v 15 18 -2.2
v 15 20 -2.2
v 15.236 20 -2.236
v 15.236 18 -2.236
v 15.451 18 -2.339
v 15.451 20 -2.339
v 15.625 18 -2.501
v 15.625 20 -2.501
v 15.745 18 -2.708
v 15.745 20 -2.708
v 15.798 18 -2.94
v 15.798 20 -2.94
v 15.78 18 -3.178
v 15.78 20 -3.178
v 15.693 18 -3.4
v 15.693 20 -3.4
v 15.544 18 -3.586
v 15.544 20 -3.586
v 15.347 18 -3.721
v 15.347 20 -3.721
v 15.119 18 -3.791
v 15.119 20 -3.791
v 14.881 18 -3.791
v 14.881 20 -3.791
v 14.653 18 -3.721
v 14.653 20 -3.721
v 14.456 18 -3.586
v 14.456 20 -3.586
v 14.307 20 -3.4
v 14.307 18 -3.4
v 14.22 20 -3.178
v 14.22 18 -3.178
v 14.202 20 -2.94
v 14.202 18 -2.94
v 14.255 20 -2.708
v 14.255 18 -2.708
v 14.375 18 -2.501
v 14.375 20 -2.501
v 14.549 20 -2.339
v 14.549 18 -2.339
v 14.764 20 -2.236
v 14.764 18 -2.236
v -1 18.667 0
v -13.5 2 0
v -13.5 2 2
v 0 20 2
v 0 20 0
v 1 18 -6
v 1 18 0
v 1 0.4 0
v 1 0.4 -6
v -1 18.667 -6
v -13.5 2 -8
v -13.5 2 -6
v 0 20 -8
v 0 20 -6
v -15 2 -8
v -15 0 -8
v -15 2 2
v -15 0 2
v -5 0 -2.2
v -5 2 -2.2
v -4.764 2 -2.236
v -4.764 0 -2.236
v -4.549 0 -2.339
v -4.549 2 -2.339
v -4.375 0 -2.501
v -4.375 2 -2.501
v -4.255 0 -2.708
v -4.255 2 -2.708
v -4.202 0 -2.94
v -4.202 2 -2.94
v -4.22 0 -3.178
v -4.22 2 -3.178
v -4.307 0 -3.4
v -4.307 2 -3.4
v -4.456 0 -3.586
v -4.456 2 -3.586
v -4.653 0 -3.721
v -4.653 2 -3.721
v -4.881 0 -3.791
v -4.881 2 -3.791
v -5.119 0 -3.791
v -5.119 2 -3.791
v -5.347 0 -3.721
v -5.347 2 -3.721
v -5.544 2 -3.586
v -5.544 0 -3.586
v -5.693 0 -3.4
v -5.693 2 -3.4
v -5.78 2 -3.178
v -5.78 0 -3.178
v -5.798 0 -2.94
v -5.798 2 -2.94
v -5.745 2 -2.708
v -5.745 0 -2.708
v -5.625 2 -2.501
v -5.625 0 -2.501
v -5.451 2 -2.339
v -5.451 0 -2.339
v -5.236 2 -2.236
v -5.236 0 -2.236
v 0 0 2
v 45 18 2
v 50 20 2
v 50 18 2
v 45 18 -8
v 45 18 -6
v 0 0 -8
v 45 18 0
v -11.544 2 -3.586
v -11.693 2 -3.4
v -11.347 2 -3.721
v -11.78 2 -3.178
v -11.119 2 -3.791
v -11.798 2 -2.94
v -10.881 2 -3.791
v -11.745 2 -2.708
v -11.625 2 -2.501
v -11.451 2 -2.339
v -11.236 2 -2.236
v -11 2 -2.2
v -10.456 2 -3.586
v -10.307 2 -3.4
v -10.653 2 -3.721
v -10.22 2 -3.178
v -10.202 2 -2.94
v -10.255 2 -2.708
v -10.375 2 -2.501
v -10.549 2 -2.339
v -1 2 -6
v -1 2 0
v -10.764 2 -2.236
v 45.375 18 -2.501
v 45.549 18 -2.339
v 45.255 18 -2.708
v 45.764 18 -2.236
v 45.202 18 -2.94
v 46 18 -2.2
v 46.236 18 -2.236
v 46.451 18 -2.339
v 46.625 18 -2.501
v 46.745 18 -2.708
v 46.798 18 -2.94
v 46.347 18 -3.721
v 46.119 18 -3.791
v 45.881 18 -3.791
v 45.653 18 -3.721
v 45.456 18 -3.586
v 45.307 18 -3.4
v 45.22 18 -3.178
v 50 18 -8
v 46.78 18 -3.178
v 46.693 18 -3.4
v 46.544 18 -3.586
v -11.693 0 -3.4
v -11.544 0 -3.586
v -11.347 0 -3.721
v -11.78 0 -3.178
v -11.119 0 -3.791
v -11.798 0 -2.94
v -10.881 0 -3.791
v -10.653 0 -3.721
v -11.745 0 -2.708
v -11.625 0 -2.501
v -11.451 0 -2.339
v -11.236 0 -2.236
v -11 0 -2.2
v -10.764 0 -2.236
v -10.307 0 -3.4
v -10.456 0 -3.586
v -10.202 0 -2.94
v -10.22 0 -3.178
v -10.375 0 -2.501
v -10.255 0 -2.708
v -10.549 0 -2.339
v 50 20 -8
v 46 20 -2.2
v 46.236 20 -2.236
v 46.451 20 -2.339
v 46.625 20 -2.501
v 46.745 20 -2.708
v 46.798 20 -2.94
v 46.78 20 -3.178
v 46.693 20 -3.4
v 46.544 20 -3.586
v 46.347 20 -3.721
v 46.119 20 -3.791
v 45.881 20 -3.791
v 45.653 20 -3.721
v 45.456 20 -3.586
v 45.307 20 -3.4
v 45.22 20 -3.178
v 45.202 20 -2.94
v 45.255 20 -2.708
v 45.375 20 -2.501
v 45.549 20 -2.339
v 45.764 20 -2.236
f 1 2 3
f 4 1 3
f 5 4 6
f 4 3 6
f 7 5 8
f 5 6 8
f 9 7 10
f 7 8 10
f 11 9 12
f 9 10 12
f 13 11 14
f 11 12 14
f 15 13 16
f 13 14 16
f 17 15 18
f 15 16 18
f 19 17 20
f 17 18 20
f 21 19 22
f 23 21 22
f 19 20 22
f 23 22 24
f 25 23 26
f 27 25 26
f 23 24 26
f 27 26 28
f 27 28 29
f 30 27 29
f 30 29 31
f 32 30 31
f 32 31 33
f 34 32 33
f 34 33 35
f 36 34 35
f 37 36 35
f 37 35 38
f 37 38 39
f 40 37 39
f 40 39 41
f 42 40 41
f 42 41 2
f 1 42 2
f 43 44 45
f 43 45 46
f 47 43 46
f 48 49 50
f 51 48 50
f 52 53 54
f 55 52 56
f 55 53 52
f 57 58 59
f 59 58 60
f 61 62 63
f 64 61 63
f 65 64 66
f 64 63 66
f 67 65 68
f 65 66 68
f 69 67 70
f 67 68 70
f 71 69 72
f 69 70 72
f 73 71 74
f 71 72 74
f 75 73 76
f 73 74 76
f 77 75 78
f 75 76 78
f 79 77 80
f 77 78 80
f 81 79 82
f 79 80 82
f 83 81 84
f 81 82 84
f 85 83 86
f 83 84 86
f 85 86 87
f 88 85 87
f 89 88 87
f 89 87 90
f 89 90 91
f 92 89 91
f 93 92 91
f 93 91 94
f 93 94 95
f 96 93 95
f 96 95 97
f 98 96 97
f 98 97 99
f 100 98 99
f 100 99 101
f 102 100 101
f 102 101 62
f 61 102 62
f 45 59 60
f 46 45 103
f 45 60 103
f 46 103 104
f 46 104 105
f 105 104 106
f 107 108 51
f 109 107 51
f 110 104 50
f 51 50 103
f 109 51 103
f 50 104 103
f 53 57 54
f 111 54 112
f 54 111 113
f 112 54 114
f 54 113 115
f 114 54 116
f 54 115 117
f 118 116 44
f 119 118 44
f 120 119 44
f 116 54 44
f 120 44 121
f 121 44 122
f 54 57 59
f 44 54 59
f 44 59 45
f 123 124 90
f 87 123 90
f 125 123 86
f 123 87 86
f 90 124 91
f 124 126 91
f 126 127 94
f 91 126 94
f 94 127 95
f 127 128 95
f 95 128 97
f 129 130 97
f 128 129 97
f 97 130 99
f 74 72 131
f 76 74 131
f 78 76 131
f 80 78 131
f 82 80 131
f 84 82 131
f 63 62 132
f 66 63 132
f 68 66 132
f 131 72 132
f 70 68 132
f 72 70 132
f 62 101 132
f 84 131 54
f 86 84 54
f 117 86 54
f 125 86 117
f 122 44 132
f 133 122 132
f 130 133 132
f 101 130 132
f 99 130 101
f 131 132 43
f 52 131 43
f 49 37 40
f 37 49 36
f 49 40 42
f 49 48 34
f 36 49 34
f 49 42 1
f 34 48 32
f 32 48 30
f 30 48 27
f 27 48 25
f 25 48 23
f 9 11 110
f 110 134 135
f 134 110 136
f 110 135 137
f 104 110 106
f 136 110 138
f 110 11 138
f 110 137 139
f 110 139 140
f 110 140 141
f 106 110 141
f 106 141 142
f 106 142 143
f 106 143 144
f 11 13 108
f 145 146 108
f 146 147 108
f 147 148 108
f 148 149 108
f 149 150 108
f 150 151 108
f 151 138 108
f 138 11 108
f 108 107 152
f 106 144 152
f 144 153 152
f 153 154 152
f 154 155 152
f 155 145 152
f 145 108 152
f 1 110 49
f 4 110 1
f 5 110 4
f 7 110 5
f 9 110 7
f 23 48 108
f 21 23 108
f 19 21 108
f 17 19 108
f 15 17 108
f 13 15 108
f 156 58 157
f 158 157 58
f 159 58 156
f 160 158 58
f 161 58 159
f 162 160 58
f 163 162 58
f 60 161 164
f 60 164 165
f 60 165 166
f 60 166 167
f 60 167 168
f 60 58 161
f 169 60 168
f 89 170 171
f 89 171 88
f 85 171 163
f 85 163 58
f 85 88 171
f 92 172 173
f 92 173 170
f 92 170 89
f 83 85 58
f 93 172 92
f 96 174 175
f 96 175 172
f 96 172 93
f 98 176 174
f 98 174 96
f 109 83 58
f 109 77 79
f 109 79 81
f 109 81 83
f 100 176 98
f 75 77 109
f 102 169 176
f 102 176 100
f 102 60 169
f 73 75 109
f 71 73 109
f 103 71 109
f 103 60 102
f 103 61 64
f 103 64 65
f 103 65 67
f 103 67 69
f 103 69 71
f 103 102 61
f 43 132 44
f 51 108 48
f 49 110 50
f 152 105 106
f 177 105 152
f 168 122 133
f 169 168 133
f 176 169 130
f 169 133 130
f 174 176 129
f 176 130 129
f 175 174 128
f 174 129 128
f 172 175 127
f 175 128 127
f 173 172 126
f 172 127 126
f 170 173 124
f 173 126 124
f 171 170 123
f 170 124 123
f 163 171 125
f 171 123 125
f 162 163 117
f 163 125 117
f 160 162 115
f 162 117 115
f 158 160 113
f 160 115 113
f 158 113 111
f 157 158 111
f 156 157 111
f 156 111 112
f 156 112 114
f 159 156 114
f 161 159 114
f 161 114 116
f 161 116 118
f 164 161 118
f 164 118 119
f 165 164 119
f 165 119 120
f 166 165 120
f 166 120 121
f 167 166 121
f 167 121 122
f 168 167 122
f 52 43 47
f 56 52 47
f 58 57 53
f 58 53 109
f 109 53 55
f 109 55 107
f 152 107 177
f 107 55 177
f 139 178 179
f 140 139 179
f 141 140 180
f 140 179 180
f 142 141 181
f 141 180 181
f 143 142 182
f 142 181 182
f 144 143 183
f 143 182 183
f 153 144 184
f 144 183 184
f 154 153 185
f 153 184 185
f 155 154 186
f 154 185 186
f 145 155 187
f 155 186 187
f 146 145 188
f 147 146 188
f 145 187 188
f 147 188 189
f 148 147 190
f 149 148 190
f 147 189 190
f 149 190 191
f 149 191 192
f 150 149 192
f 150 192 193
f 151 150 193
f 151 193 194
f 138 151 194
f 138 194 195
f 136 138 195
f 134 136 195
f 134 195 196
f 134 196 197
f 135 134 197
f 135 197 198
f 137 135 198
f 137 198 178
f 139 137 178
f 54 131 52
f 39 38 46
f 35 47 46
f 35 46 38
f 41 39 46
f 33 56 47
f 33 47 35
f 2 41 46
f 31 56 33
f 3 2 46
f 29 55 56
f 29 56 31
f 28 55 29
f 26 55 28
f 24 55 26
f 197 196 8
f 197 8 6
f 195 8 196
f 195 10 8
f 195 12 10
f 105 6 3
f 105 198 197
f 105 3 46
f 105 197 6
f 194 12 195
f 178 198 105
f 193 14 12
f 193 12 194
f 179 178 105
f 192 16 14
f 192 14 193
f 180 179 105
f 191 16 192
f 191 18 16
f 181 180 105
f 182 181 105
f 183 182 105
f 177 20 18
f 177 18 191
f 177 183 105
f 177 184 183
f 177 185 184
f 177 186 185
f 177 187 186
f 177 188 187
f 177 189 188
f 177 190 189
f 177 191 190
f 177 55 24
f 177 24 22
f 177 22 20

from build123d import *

# Parameters (mm, degrees)
BOSS_EXTRUDE1_DEPTH = 2
SKETCH2_W           = 50
SKETCH2_H           = 10
BOSS_EXTRUDE2_DEPTH = 2
SKETCH3_W           = 15
SKETCH3_H           = 10
BOSS_EXTRUDE3_DEPTH = 2
BOSS_EXTRUDE4_DEPTH = 2
BOSS_EXTRUDE5_DEPTH = 6
SKETCH7_R           = 0.8
CUT_EXTRUDE1_DEPTH  = 20


with BuildPart() as part:
    # Sketch1 → Boss-Extrude1 (new body)
    with BuildSketch(Plane.XY):
        Polygon((0, 0), (-15, 0), (0, 20), (50, 20), align=None)
    extrude(amount=BOSS_EXTRUDE1_DEPTH)

    # Sketch2 → Boss-Extrude2 (add)
    with BuildSketch(Plane(origin=(0, 20, 0), x_dir=(1, 0, 0), z_dir=(0, 1, 0))):
        with Locations((25, 3)):
            Rectangle(SKETCH2_W, SKETCH2_H)
    extrude(amount=-BOSS_EXTRUDE2_DEPTH)

    # Sketch3 → Boss-Extrude3 (add)
    with BuildSketch(Plane.XZ):
        with Locations((-7.5, -3)):
            Rectangle(SKETCH3_W, SKETCH3_H)
    extrude(amount=-BOSS_EXTRUDE3_DEPTH)

    # Sketch4 → Boss-Extrude4 (add)
    with BuildSketch(Plane(origin=(0, 0, -8), x_dir=(-1, 0, 0), z_dir=(0, 0, -1))):
        Polygon((-50, 20), (0, 0), (15, 0), (0, 20), align=None)
    extrude(amount=-BOSS_EXTRUDE4_DEPTH)

    # Sketch6 → Boss-Extrude5 (add)
    with BuildSketch(Plane(origin=(0, 0, 0), x_dir=(-1, 0, 0), z_dir=(0, 0, -1))):
        Polygon((0, 20), (0, 18), (-1, 18), (-1, 0.4), (0, 0), (0, 2), (1, 2), (1, 18.666666667), align=None)
    extrude(amount=BOSS_EXTRUDE5_DEPTH)

    # Sketch7 → Cut-Extrude1 (cut)
    with BuildSketch(Plane(origin=(0, 20, 0), x_dir=(1, 0, 0), z_dir=(0, 1, 0))):
        with Locations((46, 3)):
            Circle(SKETCH7_R)
        with Locations((15, 3)):
            Circle(SKETCH7_R)
        with Locations((-11, 3)):
            Circle(SKETCH7_R)
        with Locations((-5, 3)):
            Circle(SKETCH7_R)
    extrude(amount=-CUT_EXTRUDE1_DEPTH, mode=Mode.SUBTRACT)


solid = part.part
